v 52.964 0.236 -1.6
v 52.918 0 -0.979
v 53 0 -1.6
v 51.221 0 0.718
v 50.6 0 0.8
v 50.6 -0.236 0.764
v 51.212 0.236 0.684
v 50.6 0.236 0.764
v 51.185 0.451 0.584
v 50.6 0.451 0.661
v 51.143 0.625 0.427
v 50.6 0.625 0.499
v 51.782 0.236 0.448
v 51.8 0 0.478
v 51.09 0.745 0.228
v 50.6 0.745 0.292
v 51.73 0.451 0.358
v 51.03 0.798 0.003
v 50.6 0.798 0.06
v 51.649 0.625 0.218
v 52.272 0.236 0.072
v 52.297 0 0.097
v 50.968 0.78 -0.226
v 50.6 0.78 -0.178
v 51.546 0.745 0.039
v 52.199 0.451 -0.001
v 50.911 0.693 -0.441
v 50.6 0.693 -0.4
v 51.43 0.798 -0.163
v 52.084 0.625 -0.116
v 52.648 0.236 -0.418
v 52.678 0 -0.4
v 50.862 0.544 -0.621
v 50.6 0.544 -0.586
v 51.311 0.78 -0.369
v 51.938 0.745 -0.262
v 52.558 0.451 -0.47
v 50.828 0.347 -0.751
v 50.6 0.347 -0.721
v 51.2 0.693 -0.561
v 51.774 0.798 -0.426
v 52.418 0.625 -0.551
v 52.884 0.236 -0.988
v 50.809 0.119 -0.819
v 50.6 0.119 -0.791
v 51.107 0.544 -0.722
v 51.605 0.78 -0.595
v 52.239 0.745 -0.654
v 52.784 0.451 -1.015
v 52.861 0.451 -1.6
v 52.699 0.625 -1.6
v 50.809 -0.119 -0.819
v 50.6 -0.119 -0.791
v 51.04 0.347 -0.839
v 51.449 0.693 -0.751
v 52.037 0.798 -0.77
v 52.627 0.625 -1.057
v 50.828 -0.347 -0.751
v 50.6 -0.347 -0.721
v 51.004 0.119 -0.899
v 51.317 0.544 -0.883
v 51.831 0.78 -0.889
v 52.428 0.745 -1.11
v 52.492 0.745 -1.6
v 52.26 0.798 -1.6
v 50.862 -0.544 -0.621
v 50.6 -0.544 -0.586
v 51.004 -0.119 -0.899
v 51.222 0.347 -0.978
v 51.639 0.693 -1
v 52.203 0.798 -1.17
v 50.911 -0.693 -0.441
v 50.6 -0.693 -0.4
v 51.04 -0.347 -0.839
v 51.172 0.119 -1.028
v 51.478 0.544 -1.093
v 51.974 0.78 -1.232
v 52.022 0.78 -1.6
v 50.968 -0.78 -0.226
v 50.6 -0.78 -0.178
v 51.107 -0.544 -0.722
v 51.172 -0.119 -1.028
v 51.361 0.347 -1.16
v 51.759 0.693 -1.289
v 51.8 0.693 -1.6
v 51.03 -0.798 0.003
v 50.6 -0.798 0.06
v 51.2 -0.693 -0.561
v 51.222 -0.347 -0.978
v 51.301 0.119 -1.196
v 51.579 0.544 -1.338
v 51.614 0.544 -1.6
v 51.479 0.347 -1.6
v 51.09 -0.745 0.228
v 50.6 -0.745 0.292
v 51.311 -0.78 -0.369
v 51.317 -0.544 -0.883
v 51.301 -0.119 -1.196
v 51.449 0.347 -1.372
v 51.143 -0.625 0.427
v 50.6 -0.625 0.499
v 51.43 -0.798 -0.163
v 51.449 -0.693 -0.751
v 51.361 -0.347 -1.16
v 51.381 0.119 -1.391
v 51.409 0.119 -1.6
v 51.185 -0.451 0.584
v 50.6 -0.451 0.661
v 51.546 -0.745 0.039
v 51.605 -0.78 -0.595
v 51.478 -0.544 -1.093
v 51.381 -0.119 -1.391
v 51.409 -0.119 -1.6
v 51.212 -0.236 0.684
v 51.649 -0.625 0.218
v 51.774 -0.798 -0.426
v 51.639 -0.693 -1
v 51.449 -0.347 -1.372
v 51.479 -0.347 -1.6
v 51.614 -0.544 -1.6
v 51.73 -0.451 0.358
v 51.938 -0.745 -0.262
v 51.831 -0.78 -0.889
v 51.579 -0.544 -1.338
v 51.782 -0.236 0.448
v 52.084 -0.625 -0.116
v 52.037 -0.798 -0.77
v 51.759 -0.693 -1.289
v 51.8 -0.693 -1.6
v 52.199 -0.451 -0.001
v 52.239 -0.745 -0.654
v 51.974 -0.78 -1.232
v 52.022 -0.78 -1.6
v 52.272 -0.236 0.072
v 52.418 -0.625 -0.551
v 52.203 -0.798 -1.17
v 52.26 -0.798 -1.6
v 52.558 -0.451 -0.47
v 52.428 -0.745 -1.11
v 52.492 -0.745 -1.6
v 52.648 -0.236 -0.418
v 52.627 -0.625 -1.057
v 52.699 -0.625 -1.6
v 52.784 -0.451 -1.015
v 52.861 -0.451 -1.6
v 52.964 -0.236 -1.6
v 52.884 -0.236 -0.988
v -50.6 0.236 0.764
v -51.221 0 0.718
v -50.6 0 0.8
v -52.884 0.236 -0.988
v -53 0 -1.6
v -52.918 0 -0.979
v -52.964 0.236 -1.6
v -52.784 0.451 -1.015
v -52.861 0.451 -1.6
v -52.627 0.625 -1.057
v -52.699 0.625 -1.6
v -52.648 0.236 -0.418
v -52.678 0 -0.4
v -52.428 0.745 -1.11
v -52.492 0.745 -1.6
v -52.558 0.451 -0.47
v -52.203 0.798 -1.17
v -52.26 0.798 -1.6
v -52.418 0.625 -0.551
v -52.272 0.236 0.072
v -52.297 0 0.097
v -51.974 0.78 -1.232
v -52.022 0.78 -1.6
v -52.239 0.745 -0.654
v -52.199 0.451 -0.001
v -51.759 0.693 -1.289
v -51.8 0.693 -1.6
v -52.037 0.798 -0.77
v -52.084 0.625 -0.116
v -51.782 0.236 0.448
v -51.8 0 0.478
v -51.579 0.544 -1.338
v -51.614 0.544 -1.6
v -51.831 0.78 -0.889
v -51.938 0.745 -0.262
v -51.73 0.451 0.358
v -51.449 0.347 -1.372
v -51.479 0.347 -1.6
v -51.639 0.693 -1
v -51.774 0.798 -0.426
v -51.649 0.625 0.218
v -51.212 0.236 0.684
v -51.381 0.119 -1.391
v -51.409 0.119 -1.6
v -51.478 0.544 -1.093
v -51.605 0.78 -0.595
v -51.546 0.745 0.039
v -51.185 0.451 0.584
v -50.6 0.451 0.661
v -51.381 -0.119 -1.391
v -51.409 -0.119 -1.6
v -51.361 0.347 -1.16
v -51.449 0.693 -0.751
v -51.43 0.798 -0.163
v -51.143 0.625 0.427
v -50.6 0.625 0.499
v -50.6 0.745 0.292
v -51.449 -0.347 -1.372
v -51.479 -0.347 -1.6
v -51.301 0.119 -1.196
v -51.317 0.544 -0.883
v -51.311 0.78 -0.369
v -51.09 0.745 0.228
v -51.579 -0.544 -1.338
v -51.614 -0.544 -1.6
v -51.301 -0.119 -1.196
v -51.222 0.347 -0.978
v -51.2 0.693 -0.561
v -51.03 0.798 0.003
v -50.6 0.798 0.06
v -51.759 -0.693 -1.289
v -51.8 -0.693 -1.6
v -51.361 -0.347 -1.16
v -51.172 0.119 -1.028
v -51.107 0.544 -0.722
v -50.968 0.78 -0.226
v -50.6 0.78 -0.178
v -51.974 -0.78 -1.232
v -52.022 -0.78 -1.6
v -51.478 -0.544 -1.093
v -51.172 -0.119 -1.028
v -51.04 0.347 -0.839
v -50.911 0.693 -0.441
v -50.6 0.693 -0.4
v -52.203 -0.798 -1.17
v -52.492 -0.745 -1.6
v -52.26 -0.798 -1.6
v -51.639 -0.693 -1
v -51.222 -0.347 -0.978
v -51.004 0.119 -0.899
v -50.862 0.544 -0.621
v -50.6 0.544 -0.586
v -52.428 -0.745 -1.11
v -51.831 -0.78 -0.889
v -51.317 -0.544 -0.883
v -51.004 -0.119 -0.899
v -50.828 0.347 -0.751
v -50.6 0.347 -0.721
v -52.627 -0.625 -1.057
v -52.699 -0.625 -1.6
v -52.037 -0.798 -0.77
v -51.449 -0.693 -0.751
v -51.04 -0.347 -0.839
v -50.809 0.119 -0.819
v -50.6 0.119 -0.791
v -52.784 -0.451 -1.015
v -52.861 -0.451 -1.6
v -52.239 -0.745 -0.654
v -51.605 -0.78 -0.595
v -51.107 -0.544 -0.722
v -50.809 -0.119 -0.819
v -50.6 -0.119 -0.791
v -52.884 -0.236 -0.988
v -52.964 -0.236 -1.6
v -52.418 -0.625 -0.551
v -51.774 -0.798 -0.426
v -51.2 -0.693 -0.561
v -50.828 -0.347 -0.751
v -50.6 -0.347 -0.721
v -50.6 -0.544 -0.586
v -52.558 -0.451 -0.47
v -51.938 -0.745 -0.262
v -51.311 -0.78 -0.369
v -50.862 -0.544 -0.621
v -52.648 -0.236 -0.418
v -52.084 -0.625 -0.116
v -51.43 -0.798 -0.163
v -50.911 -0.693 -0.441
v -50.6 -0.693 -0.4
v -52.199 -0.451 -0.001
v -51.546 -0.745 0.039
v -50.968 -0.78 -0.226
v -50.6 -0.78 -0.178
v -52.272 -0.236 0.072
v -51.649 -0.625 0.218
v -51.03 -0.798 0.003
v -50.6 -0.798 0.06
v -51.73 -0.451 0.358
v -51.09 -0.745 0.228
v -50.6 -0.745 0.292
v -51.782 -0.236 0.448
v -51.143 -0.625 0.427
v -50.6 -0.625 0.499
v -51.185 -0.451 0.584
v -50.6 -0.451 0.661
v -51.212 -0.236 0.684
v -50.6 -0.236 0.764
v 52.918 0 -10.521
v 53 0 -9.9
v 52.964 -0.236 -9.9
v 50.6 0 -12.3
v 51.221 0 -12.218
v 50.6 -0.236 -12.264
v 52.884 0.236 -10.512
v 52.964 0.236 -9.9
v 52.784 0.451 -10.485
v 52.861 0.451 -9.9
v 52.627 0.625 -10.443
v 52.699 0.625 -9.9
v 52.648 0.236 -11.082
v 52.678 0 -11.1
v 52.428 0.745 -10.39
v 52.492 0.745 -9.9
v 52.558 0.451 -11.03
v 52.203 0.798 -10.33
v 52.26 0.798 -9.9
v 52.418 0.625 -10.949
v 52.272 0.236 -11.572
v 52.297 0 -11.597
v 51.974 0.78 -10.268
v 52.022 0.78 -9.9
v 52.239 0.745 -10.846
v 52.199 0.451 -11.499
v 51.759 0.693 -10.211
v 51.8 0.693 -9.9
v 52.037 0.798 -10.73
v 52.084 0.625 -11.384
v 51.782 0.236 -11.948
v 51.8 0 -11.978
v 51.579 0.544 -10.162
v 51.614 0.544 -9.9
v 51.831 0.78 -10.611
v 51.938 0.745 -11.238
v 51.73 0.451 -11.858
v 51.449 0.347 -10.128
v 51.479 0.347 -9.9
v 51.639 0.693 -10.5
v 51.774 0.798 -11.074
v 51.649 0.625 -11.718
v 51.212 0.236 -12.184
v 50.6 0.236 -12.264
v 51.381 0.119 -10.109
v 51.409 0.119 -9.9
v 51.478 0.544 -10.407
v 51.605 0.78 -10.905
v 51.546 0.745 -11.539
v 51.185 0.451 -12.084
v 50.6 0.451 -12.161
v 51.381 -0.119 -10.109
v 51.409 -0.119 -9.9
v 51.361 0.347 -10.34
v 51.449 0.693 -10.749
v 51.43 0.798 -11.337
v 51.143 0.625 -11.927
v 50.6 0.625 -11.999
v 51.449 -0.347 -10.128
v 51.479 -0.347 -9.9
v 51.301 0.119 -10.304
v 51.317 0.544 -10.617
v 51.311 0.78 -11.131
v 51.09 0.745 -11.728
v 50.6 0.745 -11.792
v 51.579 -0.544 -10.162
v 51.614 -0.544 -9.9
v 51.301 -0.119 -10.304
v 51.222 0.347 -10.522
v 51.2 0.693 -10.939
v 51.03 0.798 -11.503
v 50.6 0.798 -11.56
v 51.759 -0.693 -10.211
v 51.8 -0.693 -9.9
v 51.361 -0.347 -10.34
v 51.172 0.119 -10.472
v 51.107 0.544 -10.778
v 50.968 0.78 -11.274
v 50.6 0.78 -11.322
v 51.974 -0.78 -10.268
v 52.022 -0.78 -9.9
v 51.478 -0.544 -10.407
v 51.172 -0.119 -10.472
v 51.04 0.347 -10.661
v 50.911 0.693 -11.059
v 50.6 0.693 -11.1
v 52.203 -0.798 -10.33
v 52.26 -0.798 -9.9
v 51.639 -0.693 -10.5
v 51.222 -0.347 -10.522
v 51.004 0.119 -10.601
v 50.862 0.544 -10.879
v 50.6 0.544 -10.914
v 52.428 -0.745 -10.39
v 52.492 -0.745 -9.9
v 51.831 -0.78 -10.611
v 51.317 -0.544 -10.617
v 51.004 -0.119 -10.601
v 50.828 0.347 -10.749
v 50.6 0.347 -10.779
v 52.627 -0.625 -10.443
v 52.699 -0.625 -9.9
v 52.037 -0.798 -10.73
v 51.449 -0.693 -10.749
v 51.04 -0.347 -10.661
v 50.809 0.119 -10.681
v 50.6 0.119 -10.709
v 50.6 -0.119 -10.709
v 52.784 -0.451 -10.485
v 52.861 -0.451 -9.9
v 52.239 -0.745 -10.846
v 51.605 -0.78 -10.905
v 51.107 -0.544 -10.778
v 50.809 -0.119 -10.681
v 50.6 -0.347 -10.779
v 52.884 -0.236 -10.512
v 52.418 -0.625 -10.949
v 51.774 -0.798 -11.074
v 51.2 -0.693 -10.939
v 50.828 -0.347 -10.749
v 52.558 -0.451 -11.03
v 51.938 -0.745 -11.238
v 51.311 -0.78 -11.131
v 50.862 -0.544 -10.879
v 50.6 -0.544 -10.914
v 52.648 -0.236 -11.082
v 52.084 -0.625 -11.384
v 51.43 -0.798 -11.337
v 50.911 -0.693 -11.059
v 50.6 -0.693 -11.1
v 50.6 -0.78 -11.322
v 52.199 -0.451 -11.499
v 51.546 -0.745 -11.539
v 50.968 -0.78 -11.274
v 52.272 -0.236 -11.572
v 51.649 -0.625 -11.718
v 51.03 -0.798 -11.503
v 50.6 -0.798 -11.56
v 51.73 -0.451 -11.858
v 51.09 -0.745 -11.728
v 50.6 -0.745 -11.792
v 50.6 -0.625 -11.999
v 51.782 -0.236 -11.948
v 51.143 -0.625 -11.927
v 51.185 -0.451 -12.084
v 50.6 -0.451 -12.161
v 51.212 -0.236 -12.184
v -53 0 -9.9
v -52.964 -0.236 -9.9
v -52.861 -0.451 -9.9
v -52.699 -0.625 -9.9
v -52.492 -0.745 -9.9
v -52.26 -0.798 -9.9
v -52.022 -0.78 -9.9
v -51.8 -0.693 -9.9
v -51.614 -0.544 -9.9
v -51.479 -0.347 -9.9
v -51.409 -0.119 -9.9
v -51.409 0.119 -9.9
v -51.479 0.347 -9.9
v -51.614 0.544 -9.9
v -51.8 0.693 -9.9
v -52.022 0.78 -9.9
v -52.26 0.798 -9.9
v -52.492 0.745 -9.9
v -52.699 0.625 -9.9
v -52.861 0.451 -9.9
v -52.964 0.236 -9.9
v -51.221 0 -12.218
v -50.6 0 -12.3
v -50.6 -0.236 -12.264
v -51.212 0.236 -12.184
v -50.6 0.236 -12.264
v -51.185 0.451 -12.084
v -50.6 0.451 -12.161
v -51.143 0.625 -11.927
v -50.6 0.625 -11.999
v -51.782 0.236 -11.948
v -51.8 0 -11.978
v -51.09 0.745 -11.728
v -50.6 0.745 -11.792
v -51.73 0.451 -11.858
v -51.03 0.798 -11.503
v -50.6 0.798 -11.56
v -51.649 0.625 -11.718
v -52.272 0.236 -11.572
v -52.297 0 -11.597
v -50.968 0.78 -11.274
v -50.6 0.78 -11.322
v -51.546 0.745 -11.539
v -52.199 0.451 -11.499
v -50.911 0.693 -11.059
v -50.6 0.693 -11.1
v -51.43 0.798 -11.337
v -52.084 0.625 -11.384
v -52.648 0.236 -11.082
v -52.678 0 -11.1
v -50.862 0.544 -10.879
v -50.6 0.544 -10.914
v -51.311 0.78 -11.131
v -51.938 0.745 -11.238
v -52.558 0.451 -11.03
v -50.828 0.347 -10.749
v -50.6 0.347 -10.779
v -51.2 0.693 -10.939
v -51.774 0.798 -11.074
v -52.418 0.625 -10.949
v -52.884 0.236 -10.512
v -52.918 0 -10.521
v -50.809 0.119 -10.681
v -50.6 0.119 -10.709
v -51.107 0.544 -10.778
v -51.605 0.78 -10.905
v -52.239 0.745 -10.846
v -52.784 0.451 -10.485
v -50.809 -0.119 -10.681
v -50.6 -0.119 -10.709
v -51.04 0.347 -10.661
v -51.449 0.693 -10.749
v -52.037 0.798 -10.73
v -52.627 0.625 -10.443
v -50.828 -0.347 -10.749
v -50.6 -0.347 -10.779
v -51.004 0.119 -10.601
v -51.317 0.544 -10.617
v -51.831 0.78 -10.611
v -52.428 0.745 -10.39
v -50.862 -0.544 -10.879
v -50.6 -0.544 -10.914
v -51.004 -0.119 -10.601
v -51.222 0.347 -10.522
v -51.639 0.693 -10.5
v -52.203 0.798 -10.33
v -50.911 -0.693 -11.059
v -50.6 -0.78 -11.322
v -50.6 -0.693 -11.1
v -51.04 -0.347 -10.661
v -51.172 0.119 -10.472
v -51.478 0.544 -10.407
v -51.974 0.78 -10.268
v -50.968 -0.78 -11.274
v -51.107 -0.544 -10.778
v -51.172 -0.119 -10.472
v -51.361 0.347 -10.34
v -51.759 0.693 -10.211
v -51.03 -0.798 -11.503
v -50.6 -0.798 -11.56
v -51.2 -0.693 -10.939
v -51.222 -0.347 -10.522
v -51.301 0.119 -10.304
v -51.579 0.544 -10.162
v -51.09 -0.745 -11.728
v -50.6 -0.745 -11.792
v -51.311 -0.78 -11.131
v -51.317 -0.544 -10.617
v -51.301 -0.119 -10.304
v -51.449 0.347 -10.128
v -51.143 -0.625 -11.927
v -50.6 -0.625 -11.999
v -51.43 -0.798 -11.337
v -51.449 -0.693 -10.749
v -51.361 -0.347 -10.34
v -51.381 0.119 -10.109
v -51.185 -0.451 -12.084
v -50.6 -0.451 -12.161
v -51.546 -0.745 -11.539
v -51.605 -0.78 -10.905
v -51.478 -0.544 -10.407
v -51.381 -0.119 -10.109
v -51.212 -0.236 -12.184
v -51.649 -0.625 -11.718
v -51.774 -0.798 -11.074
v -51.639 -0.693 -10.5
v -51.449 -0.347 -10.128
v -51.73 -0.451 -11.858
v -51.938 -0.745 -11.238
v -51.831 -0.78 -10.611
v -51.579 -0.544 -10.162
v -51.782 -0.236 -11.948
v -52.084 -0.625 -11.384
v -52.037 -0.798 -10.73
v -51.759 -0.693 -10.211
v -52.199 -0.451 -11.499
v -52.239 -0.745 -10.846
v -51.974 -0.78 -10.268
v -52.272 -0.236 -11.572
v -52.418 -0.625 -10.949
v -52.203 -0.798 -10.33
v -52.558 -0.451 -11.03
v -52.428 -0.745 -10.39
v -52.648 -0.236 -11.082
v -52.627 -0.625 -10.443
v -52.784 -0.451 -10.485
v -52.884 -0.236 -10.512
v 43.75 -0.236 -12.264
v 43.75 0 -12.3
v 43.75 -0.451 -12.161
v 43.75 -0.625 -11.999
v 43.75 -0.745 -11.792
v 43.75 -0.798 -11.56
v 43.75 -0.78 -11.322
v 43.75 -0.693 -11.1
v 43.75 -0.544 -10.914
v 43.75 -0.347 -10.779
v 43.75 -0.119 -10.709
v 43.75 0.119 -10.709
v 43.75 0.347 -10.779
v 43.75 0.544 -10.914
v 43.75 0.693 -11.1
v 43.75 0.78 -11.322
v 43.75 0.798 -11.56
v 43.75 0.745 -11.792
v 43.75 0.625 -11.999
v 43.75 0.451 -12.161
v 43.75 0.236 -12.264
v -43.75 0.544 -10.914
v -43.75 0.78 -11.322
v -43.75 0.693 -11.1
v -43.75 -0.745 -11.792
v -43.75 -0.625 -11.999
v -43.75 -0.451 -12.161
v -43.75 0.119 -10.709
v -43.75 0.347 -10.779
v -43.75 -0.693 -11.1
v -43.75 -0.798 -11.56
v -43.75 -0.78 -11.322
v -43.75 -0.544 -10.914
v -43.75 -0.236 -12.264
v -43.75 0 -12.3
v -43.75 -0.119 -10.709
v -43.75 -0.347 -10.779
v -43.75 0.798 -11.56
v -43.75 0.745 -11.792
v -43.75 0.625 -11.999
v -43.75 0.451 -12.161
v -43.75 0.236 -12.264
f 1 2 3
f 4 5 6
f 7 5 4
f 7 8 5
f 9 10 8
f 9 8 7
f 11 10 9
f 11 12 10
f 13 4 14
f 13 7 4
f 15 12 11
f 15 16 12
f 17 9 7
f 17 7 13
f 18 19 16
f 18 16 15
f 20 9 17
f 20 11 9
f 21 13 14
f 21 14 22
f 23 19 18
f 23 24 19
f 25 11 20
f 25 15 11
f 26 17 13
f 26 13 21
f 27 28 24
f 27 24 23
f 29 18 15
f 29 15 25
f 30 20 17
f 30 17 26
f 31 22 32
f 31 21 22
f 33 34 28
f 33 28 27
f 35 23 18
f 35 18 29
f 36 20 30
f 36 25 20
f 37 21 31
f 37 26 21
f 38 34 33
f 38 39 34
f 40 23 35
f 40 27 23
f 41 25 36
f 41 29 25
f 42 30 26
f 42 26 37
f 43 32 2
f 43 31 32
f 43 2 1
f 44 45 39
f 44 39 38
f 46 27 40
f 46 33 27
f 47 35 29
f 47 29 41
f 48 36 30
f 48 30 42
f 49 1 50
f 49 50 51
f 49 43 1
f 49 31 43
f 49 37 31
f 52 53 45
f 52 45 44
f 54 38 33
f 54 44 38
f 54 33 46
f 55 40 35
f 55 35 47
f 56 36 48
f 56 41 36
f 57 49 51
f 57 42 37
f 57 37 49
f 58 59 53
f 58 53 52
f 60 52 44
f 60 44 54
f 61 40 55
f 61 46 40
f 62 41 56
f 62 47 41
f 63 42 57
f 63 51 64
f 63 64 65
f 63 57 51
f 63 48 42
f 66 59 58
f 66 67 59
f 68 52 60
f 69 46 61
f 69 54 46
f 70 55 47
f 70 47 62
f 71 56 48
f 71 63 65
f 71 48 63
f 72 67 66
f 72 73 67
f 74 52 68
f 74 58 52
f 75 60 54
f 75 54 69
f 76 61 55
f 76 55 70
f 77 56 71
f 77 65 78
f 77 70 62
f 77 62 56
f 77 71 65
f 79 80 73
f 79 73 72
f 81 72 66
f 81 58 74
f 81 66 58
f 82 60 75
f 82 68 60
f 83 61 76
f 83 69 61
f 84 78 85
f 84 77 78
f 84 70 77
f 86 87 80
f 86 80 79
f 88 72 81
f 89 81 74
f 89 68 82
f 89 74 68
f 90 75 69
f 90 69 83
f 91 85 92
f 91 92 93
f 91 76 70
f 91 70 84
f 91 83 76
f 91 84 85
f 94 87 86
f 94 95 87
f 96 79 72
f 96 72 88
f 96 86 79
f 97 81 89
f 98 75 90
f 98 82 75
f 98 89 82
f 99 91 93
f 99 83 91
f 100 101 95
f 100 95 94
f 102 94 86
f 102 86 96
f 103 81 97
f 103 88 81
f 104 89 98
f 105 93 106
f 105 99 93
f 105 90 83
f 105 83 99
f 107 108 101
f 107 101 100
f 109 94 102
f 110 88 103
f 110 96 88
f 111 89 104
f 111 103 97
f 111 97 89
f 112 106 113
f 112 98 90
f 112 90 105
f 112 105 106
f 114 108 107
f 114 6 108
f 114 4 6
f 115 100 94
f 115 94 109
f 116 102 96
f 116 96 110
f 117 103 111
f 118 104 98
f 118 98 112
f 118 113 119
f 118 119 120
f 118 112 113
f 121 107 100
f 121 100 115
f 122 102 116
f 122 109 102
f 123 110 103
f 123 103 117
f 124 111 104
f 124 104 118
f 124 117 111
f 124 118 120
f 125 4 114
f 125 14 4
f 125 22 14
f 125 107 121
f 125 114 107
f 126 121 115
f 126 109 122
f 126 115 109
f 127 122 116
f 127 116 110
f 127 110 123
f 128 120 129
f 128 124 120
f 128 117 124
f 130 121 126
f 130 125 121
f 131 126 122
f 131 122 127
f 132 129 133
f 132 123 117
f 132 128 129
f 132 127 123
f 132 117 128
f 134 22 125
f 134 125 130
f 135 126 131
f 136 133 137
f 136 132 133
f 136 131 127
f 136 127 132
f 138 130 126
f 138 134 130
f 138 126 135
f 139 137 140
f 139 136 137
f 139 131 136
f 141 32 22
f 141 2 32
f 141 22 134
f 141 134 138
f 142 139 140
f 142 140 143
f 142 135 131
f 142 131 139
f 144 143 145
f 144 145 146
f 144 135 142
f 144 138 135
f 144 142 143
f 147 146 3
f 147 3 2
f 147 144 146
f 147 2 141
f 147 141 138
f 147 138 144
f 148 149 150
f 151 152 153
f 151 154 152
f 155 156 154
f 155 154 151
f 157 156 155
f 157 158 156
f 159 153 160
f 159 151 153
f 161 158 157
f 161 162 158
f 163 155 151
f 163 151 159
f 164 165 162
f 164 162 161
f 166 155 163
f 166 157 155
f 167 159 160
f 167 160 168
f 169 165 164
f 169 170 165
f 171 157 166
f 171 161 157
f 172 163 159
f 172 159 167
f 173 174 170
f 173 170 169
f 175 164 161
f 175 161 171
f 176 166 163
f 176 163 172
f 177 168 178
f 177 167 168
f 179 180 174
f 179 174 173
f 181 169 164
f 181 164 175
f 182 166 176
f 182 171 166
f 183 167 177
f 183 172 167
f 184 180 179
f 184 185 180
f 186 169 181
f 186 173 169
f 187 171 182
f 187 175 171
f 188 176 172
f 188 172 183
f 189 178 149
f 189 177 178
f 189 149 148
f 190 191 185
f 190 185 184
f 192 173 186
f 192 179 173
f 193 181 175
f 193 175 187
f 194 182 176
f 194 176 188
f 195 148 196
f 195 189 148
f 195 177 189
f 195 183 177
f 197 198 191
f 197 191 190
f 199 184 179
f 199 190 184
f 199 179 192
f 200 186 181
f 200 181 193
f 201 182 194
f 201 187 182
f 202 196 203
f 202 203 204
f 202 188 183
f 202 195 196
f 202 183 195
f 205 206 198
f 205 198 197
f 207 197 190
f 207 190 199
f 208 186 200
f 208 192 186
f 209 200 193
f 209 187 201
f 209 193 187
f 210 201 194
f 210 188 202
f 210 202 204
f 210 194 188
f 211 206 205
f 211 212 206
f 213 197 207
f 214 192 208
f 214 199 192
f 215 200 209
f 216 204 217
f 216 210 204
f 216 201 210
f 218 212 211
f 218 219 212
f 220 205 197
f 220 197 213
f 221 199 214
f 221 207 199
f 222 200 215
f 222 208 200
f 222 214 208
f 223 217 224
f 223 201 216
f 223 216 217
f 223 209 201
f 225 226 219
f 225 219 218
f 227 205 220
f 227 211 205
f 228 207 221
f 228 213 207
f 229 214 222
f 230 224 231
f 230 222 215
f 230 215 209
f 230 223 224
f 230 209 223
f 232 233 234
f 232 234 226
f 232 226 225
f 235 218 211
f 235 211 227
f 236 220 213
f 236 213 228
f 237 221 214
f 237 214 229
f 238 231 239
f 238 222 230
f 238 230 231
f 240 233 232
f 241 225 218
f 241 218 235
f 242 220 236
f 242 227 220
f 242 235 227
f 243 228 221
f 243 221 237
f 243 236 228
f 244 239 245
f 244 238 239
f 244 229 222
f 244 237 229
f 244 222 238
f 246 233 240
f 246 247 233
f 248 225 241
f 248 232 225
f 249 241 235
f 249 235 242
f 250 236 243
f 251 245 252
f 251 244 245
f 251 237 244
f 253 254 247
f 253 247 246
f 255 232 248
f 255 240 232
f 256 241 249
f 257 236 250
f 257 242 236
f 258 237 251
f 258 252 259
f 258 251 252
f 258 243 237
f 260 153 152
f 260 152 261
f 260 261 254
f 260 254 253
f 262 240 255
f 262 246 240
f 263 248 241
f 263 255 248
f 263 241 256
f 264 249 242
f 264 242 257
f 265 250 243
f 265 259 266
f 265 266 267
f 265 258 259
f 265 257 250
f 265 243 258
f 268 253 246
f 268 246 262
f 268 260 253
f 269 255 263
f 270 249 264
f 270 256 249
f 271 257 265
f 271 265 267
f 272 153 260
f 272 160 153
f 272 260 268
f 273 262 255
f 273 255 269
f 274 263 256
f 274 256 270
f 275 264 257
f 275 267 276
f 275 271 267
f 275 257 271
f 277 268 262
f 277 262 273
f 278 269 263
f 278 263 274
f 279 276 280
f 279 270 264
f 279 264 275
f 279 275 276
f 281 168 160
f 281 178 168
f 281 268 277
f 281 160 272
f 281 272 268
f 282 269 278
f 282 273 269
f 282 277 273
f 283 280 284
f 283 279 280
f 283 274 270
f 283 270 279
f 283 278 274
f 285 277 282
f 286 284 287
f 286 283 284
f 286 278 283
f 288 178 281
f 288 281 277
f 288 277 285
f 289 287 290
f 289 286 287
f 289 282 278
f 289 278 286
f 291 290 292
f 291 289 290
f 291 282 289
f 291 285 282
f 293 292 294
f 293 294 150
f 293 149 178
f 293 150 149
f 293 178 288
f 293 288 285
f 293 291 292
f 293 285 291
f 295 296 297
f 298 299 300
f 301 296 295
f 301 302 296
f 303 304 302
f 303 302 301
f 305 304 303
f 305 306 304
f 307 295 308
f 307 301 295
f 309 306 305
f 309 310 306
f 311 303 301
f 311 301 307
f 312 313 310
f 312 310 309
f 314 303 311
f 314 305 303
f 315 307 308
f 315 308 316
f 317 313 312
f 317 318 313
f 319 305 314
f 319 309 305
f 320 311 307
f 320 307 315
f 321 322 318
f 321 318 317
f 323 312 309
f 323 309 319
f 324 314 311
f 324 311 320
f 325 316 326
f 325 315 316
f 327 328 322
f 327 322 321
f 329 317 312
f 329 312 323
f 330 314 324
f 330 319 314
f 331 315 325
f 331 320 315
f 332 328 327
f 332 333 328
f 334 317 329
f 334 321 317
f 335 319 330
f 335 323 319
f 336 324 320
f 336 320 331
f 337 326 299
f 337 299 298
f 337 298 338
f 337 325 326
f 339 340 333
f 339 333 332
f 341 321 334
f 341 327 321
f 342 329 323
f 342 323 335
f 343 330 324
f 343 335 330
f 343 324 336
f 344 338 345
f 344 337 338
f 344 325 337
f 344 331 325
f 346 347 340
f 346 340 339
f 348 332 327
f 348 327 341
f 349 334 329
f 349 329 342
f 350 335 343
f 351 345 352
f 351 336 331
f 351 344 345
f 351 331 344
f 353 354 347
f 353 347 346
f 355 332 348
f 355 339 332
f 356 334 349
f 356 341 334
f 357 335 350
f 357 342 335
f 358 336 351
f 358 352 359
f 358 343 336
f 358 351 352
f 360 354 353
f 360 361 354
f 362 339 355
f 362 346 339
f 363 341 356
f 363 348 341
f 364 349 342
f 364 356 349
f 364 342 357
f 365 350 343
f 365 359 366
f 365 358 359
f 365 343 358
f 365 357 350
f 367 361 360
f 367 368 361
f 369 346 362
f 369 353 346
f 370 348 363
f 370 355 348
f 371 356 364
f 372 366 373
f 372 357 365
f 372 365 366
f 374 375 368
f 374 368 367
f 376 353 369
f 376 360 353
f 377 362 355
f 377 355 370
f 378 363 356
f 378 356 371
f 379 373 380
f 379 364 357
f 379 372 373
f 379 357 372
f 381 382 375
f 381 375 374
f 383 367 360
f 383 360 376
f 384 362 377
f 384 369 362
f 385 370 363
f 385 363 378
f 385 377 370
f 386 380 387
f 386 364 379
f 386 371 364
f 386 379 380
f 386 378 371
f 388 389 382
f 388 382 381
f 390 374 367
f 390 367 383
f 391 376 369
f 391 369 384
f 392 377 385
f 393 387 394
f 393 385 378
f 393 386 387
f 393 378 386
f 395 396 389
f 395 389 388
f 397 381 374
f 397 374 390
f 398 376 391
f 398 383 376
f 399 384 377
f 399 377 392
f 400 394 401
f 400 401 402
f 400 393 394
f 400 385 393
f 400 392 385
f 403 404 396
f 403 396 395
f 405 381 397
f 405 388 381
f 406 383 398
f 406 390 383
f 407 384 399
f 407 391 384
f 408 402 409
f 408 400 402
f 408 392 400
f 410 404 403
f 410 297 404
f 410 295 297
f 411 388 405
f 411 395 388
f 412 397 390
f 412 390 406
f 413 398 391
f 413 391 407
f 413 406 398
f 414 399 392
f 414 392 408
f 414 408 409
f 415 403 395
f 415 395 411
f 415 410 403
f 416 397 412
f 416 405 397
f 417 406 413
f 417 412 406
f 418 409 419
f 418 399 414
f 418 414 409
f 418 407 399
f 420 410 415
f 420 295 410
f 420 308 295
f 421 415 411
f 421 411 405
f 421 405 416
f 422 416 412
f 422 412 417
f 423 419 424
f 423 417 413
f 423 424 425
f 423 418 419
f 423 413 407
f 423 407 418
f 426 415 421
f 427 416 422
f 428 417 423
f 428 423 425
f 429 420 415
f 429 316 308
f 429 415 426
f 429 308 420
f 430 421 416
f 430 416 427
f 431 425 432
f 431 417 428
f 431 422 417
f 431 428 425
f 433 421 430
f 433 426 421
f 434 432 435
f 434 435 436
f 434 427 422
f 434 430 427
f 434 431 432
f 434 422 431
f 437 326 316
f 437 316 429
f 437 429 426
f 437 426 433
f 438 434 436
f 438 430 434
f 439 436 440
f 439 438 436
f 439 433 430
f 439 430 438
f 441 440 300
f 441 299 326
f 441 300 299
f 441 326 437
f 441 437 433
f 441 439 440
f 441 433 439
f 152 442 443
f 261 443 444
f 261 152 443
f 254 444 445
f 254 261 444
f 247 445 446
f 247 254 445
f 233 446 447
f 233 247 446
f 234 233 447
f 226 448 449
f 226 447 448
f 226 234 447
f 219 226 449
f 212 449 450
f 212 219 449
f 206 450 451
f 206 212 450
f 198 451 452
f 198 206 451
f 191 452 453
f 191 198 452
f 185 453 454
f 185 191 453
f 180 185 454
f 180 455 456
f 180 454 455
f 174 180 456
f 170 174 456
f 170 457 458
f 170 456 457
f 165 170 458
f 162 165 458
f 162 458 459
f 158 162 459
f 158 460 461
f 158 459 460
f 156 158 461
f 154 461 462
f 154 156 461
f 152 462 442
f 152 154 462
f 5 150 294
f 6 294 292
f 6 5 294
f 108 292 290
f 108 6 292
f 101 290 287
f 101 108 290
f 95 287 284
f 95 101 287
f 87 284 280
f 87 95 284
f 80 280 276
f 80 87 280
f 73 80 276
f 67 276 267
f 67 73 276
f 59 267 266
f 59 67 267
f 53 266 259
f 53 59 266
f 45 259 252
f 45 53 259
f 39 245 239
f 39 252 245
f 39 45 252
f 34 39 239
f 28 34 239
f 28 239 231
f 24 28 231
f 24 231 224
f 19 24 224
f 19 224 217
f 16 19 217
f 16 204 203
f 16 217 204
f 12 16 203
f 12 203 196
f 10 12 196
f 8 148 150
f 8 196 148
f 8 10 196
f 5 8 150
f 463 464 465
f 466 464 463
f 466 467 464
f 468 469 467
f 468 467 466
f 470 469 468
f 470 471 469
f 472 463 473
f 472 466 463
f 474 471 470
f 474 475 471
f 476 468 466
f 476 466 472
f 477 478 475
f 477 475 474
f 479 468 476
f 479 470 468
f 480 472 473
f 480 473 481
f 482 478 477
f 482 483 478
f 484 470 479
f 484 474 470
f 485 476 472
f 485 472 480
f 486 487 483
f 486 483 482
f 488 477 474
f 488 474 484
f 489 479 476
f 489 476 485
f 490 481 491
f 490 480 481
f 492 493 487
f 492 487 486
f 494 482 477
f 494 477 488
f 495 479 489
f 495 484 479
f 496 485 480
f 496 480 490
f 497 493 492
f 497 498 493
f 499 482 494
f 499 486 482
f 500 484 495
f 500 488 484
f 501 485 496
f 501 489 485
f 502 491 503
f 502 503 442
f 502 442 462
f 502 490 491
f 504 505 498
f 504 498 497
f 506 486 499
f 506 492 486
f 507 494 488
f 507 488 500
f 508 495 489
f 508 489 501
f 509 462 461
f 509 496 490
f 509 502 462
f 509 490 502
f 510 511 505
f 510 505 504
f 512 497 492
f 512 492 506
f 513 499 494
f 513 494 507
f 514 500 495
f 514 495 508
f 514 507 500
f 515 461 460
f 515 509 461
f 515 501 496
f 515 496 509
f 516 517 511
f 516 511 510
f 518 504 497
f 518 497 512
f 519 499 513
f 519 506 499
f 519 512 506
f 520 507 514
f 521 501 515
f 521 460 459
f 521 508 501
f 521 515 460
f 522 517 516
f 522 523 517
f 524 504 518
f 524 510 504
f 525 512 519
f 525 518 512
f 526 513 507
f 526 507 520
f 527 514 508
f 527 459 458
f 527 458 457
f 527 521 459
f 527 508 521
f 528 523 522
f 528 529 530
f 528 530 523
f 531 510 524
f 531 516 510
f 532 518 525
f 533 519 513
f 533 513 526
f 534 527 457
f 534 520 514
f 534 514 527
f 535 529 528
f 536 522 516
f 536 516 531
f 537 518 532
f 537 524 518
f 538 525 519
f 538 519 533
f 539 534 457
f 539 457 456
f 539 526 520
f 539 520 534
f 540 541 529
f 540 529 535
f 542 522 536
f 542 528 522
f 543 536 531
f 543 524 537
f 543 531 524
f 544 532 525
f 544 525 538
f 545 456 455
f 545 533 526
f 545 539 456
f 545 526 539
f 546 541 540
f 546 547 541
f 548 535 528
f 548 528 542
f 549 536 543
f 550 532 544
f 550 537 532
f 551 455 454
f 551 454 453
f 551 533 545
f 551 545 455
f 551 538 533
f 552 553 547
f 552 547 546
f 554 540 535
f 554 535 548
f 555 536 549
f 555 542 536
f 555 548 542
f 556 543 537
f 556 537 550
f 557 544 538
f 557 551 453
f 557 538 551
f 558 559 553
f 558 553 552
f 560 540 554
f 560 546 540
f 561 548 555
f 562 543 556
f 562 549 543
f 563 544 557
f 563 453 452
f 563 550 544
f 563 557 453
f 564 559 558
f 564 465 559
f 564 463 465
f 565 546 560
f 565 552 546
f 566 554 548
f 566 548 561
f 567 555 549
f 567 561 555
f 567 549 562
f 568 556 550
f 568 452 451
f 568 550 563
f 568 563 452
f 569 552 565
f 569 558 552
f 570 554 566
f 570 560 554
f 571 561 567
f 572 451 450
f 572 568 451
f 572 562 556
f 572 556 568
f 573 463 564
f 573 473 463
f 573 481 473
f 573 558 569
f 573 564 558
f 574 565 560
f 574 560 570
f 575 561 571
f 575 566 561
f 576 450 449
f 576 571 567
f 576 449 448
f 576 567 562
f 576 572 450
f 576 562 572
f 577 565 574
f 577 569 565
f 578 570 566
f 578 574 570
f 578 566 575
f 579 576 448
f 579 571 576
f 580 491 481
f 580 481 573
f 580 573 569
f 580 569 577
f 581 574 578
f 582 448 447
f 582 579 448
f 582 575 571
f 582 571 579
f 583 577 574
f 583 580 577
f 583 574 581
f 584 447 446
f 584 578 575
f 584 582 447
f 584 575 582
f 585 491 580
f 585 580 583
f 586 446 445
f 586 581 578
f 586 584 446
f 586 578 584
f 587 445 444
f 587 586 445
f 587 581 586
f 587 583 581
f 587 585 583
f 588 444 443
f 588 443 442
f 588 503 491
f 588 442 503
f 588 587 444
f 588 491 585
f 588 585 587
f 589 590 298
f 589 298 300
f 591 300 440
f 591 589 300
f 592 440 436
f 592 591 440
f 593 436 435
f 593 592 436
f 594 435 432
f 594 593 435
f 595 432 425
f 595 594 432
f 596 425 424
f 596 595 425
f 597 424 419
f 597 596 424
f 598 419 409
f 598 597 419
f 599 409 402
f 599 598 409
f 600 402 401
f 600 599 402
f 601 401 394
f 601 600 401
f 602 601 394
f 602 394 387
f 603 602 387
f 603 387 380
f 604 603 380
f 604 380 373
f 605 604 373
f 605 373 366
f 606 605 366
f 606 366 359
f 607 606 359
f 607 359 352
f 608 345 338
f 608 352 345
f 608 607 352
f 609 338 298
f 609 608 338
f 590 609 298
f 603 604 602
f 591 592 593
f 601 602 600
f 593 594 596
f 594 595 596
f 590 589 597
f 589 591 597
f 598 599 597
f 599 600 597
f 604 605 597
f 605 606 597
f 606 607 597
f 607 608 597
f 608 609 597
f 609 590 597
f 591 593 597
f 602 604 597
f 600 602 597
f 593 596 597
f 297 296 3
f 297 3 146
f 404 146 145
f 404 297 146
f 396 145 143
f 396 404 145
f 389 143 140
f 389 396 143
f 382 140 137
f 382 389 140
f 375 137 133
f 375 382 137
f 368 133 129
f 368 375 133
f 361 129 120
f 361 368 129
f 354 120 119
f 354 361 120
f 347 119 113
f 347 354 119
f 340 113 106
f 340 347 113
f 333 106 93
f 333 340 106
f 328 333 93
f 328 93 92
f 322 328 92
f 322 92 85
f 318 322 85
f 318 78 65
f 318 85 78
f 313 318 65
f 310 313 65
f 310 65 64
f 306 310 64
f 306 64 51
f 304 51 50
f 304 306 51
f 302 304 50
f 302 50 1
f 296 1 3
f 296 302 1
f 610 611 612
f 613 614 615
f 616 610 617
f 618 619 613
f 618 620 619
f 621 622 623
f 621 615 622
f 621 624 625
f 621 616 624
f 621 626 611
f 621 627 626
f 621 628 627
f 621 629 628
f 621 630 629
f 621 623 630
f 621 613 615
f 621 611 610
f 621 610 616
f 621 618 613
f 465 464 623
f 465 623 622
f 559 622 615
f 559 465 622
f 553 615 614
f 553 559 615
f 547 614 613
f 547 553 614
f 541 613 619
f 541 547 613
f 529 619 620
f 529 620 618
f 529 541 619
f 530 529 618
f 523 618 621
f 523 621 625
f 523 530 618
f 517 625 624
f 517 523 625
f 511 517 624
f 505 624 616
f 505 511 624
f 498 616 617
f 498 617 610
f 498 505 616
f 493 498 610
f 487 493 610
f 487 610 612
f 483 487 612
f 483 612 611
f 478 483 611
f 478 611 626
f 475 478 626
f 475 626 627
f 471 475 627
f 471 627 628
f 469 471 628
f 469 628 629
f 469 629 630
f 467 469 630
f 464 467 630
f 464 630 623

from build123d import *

# Parameters (mm, degrees)
SEGMENT_R = 0.8


with BuildPart() as part:
    # Wire 2: sweep along a path in Path
    with BuildLine(Plane(origin=(0, 0, 0), x_dir=(1, 0, 0), z_dir=(0, 1, 0))) as wire_2_path:
        Line((-43.75, 11.5), (-50.6, 11.5))
        ThreePointArc((-50.6, 11.5), (-51.73137085, 11.03137085), (-52.2, 9.9))
        Line((-52.2, 9.9), (-52.2, 1.6))
        ThreePointArc((-52.2, 1.6), (-51.73137085, 0.46862915), (-50.6, 0))
        Line((-50.6, 0), (50.6, 0))
        ThreePointArc((50.6, 0), (51.73137085, 0.46862915), (52.2, 1.6))
        Line((52.2, 1.6), (52.2, 9.9))
        ThreePointArc((52.2, 9.9), (51.73137085, 11.03137085), (50.6, 11.5))
        Line((50.6, 11.5), (43.75, 11.5))
    # Segment → Wire 2 (sweep)
    with BuildSketch(Plane(origin=(-43.75, 0, 0), x_dir=(0, 0, -1), z_dir=(1, 0, 0))):
        with Locations((11.5, 0)):
            Circle(SEGMENT_R)
    sweep(path=wire_2_path.line)


solid = part.part
